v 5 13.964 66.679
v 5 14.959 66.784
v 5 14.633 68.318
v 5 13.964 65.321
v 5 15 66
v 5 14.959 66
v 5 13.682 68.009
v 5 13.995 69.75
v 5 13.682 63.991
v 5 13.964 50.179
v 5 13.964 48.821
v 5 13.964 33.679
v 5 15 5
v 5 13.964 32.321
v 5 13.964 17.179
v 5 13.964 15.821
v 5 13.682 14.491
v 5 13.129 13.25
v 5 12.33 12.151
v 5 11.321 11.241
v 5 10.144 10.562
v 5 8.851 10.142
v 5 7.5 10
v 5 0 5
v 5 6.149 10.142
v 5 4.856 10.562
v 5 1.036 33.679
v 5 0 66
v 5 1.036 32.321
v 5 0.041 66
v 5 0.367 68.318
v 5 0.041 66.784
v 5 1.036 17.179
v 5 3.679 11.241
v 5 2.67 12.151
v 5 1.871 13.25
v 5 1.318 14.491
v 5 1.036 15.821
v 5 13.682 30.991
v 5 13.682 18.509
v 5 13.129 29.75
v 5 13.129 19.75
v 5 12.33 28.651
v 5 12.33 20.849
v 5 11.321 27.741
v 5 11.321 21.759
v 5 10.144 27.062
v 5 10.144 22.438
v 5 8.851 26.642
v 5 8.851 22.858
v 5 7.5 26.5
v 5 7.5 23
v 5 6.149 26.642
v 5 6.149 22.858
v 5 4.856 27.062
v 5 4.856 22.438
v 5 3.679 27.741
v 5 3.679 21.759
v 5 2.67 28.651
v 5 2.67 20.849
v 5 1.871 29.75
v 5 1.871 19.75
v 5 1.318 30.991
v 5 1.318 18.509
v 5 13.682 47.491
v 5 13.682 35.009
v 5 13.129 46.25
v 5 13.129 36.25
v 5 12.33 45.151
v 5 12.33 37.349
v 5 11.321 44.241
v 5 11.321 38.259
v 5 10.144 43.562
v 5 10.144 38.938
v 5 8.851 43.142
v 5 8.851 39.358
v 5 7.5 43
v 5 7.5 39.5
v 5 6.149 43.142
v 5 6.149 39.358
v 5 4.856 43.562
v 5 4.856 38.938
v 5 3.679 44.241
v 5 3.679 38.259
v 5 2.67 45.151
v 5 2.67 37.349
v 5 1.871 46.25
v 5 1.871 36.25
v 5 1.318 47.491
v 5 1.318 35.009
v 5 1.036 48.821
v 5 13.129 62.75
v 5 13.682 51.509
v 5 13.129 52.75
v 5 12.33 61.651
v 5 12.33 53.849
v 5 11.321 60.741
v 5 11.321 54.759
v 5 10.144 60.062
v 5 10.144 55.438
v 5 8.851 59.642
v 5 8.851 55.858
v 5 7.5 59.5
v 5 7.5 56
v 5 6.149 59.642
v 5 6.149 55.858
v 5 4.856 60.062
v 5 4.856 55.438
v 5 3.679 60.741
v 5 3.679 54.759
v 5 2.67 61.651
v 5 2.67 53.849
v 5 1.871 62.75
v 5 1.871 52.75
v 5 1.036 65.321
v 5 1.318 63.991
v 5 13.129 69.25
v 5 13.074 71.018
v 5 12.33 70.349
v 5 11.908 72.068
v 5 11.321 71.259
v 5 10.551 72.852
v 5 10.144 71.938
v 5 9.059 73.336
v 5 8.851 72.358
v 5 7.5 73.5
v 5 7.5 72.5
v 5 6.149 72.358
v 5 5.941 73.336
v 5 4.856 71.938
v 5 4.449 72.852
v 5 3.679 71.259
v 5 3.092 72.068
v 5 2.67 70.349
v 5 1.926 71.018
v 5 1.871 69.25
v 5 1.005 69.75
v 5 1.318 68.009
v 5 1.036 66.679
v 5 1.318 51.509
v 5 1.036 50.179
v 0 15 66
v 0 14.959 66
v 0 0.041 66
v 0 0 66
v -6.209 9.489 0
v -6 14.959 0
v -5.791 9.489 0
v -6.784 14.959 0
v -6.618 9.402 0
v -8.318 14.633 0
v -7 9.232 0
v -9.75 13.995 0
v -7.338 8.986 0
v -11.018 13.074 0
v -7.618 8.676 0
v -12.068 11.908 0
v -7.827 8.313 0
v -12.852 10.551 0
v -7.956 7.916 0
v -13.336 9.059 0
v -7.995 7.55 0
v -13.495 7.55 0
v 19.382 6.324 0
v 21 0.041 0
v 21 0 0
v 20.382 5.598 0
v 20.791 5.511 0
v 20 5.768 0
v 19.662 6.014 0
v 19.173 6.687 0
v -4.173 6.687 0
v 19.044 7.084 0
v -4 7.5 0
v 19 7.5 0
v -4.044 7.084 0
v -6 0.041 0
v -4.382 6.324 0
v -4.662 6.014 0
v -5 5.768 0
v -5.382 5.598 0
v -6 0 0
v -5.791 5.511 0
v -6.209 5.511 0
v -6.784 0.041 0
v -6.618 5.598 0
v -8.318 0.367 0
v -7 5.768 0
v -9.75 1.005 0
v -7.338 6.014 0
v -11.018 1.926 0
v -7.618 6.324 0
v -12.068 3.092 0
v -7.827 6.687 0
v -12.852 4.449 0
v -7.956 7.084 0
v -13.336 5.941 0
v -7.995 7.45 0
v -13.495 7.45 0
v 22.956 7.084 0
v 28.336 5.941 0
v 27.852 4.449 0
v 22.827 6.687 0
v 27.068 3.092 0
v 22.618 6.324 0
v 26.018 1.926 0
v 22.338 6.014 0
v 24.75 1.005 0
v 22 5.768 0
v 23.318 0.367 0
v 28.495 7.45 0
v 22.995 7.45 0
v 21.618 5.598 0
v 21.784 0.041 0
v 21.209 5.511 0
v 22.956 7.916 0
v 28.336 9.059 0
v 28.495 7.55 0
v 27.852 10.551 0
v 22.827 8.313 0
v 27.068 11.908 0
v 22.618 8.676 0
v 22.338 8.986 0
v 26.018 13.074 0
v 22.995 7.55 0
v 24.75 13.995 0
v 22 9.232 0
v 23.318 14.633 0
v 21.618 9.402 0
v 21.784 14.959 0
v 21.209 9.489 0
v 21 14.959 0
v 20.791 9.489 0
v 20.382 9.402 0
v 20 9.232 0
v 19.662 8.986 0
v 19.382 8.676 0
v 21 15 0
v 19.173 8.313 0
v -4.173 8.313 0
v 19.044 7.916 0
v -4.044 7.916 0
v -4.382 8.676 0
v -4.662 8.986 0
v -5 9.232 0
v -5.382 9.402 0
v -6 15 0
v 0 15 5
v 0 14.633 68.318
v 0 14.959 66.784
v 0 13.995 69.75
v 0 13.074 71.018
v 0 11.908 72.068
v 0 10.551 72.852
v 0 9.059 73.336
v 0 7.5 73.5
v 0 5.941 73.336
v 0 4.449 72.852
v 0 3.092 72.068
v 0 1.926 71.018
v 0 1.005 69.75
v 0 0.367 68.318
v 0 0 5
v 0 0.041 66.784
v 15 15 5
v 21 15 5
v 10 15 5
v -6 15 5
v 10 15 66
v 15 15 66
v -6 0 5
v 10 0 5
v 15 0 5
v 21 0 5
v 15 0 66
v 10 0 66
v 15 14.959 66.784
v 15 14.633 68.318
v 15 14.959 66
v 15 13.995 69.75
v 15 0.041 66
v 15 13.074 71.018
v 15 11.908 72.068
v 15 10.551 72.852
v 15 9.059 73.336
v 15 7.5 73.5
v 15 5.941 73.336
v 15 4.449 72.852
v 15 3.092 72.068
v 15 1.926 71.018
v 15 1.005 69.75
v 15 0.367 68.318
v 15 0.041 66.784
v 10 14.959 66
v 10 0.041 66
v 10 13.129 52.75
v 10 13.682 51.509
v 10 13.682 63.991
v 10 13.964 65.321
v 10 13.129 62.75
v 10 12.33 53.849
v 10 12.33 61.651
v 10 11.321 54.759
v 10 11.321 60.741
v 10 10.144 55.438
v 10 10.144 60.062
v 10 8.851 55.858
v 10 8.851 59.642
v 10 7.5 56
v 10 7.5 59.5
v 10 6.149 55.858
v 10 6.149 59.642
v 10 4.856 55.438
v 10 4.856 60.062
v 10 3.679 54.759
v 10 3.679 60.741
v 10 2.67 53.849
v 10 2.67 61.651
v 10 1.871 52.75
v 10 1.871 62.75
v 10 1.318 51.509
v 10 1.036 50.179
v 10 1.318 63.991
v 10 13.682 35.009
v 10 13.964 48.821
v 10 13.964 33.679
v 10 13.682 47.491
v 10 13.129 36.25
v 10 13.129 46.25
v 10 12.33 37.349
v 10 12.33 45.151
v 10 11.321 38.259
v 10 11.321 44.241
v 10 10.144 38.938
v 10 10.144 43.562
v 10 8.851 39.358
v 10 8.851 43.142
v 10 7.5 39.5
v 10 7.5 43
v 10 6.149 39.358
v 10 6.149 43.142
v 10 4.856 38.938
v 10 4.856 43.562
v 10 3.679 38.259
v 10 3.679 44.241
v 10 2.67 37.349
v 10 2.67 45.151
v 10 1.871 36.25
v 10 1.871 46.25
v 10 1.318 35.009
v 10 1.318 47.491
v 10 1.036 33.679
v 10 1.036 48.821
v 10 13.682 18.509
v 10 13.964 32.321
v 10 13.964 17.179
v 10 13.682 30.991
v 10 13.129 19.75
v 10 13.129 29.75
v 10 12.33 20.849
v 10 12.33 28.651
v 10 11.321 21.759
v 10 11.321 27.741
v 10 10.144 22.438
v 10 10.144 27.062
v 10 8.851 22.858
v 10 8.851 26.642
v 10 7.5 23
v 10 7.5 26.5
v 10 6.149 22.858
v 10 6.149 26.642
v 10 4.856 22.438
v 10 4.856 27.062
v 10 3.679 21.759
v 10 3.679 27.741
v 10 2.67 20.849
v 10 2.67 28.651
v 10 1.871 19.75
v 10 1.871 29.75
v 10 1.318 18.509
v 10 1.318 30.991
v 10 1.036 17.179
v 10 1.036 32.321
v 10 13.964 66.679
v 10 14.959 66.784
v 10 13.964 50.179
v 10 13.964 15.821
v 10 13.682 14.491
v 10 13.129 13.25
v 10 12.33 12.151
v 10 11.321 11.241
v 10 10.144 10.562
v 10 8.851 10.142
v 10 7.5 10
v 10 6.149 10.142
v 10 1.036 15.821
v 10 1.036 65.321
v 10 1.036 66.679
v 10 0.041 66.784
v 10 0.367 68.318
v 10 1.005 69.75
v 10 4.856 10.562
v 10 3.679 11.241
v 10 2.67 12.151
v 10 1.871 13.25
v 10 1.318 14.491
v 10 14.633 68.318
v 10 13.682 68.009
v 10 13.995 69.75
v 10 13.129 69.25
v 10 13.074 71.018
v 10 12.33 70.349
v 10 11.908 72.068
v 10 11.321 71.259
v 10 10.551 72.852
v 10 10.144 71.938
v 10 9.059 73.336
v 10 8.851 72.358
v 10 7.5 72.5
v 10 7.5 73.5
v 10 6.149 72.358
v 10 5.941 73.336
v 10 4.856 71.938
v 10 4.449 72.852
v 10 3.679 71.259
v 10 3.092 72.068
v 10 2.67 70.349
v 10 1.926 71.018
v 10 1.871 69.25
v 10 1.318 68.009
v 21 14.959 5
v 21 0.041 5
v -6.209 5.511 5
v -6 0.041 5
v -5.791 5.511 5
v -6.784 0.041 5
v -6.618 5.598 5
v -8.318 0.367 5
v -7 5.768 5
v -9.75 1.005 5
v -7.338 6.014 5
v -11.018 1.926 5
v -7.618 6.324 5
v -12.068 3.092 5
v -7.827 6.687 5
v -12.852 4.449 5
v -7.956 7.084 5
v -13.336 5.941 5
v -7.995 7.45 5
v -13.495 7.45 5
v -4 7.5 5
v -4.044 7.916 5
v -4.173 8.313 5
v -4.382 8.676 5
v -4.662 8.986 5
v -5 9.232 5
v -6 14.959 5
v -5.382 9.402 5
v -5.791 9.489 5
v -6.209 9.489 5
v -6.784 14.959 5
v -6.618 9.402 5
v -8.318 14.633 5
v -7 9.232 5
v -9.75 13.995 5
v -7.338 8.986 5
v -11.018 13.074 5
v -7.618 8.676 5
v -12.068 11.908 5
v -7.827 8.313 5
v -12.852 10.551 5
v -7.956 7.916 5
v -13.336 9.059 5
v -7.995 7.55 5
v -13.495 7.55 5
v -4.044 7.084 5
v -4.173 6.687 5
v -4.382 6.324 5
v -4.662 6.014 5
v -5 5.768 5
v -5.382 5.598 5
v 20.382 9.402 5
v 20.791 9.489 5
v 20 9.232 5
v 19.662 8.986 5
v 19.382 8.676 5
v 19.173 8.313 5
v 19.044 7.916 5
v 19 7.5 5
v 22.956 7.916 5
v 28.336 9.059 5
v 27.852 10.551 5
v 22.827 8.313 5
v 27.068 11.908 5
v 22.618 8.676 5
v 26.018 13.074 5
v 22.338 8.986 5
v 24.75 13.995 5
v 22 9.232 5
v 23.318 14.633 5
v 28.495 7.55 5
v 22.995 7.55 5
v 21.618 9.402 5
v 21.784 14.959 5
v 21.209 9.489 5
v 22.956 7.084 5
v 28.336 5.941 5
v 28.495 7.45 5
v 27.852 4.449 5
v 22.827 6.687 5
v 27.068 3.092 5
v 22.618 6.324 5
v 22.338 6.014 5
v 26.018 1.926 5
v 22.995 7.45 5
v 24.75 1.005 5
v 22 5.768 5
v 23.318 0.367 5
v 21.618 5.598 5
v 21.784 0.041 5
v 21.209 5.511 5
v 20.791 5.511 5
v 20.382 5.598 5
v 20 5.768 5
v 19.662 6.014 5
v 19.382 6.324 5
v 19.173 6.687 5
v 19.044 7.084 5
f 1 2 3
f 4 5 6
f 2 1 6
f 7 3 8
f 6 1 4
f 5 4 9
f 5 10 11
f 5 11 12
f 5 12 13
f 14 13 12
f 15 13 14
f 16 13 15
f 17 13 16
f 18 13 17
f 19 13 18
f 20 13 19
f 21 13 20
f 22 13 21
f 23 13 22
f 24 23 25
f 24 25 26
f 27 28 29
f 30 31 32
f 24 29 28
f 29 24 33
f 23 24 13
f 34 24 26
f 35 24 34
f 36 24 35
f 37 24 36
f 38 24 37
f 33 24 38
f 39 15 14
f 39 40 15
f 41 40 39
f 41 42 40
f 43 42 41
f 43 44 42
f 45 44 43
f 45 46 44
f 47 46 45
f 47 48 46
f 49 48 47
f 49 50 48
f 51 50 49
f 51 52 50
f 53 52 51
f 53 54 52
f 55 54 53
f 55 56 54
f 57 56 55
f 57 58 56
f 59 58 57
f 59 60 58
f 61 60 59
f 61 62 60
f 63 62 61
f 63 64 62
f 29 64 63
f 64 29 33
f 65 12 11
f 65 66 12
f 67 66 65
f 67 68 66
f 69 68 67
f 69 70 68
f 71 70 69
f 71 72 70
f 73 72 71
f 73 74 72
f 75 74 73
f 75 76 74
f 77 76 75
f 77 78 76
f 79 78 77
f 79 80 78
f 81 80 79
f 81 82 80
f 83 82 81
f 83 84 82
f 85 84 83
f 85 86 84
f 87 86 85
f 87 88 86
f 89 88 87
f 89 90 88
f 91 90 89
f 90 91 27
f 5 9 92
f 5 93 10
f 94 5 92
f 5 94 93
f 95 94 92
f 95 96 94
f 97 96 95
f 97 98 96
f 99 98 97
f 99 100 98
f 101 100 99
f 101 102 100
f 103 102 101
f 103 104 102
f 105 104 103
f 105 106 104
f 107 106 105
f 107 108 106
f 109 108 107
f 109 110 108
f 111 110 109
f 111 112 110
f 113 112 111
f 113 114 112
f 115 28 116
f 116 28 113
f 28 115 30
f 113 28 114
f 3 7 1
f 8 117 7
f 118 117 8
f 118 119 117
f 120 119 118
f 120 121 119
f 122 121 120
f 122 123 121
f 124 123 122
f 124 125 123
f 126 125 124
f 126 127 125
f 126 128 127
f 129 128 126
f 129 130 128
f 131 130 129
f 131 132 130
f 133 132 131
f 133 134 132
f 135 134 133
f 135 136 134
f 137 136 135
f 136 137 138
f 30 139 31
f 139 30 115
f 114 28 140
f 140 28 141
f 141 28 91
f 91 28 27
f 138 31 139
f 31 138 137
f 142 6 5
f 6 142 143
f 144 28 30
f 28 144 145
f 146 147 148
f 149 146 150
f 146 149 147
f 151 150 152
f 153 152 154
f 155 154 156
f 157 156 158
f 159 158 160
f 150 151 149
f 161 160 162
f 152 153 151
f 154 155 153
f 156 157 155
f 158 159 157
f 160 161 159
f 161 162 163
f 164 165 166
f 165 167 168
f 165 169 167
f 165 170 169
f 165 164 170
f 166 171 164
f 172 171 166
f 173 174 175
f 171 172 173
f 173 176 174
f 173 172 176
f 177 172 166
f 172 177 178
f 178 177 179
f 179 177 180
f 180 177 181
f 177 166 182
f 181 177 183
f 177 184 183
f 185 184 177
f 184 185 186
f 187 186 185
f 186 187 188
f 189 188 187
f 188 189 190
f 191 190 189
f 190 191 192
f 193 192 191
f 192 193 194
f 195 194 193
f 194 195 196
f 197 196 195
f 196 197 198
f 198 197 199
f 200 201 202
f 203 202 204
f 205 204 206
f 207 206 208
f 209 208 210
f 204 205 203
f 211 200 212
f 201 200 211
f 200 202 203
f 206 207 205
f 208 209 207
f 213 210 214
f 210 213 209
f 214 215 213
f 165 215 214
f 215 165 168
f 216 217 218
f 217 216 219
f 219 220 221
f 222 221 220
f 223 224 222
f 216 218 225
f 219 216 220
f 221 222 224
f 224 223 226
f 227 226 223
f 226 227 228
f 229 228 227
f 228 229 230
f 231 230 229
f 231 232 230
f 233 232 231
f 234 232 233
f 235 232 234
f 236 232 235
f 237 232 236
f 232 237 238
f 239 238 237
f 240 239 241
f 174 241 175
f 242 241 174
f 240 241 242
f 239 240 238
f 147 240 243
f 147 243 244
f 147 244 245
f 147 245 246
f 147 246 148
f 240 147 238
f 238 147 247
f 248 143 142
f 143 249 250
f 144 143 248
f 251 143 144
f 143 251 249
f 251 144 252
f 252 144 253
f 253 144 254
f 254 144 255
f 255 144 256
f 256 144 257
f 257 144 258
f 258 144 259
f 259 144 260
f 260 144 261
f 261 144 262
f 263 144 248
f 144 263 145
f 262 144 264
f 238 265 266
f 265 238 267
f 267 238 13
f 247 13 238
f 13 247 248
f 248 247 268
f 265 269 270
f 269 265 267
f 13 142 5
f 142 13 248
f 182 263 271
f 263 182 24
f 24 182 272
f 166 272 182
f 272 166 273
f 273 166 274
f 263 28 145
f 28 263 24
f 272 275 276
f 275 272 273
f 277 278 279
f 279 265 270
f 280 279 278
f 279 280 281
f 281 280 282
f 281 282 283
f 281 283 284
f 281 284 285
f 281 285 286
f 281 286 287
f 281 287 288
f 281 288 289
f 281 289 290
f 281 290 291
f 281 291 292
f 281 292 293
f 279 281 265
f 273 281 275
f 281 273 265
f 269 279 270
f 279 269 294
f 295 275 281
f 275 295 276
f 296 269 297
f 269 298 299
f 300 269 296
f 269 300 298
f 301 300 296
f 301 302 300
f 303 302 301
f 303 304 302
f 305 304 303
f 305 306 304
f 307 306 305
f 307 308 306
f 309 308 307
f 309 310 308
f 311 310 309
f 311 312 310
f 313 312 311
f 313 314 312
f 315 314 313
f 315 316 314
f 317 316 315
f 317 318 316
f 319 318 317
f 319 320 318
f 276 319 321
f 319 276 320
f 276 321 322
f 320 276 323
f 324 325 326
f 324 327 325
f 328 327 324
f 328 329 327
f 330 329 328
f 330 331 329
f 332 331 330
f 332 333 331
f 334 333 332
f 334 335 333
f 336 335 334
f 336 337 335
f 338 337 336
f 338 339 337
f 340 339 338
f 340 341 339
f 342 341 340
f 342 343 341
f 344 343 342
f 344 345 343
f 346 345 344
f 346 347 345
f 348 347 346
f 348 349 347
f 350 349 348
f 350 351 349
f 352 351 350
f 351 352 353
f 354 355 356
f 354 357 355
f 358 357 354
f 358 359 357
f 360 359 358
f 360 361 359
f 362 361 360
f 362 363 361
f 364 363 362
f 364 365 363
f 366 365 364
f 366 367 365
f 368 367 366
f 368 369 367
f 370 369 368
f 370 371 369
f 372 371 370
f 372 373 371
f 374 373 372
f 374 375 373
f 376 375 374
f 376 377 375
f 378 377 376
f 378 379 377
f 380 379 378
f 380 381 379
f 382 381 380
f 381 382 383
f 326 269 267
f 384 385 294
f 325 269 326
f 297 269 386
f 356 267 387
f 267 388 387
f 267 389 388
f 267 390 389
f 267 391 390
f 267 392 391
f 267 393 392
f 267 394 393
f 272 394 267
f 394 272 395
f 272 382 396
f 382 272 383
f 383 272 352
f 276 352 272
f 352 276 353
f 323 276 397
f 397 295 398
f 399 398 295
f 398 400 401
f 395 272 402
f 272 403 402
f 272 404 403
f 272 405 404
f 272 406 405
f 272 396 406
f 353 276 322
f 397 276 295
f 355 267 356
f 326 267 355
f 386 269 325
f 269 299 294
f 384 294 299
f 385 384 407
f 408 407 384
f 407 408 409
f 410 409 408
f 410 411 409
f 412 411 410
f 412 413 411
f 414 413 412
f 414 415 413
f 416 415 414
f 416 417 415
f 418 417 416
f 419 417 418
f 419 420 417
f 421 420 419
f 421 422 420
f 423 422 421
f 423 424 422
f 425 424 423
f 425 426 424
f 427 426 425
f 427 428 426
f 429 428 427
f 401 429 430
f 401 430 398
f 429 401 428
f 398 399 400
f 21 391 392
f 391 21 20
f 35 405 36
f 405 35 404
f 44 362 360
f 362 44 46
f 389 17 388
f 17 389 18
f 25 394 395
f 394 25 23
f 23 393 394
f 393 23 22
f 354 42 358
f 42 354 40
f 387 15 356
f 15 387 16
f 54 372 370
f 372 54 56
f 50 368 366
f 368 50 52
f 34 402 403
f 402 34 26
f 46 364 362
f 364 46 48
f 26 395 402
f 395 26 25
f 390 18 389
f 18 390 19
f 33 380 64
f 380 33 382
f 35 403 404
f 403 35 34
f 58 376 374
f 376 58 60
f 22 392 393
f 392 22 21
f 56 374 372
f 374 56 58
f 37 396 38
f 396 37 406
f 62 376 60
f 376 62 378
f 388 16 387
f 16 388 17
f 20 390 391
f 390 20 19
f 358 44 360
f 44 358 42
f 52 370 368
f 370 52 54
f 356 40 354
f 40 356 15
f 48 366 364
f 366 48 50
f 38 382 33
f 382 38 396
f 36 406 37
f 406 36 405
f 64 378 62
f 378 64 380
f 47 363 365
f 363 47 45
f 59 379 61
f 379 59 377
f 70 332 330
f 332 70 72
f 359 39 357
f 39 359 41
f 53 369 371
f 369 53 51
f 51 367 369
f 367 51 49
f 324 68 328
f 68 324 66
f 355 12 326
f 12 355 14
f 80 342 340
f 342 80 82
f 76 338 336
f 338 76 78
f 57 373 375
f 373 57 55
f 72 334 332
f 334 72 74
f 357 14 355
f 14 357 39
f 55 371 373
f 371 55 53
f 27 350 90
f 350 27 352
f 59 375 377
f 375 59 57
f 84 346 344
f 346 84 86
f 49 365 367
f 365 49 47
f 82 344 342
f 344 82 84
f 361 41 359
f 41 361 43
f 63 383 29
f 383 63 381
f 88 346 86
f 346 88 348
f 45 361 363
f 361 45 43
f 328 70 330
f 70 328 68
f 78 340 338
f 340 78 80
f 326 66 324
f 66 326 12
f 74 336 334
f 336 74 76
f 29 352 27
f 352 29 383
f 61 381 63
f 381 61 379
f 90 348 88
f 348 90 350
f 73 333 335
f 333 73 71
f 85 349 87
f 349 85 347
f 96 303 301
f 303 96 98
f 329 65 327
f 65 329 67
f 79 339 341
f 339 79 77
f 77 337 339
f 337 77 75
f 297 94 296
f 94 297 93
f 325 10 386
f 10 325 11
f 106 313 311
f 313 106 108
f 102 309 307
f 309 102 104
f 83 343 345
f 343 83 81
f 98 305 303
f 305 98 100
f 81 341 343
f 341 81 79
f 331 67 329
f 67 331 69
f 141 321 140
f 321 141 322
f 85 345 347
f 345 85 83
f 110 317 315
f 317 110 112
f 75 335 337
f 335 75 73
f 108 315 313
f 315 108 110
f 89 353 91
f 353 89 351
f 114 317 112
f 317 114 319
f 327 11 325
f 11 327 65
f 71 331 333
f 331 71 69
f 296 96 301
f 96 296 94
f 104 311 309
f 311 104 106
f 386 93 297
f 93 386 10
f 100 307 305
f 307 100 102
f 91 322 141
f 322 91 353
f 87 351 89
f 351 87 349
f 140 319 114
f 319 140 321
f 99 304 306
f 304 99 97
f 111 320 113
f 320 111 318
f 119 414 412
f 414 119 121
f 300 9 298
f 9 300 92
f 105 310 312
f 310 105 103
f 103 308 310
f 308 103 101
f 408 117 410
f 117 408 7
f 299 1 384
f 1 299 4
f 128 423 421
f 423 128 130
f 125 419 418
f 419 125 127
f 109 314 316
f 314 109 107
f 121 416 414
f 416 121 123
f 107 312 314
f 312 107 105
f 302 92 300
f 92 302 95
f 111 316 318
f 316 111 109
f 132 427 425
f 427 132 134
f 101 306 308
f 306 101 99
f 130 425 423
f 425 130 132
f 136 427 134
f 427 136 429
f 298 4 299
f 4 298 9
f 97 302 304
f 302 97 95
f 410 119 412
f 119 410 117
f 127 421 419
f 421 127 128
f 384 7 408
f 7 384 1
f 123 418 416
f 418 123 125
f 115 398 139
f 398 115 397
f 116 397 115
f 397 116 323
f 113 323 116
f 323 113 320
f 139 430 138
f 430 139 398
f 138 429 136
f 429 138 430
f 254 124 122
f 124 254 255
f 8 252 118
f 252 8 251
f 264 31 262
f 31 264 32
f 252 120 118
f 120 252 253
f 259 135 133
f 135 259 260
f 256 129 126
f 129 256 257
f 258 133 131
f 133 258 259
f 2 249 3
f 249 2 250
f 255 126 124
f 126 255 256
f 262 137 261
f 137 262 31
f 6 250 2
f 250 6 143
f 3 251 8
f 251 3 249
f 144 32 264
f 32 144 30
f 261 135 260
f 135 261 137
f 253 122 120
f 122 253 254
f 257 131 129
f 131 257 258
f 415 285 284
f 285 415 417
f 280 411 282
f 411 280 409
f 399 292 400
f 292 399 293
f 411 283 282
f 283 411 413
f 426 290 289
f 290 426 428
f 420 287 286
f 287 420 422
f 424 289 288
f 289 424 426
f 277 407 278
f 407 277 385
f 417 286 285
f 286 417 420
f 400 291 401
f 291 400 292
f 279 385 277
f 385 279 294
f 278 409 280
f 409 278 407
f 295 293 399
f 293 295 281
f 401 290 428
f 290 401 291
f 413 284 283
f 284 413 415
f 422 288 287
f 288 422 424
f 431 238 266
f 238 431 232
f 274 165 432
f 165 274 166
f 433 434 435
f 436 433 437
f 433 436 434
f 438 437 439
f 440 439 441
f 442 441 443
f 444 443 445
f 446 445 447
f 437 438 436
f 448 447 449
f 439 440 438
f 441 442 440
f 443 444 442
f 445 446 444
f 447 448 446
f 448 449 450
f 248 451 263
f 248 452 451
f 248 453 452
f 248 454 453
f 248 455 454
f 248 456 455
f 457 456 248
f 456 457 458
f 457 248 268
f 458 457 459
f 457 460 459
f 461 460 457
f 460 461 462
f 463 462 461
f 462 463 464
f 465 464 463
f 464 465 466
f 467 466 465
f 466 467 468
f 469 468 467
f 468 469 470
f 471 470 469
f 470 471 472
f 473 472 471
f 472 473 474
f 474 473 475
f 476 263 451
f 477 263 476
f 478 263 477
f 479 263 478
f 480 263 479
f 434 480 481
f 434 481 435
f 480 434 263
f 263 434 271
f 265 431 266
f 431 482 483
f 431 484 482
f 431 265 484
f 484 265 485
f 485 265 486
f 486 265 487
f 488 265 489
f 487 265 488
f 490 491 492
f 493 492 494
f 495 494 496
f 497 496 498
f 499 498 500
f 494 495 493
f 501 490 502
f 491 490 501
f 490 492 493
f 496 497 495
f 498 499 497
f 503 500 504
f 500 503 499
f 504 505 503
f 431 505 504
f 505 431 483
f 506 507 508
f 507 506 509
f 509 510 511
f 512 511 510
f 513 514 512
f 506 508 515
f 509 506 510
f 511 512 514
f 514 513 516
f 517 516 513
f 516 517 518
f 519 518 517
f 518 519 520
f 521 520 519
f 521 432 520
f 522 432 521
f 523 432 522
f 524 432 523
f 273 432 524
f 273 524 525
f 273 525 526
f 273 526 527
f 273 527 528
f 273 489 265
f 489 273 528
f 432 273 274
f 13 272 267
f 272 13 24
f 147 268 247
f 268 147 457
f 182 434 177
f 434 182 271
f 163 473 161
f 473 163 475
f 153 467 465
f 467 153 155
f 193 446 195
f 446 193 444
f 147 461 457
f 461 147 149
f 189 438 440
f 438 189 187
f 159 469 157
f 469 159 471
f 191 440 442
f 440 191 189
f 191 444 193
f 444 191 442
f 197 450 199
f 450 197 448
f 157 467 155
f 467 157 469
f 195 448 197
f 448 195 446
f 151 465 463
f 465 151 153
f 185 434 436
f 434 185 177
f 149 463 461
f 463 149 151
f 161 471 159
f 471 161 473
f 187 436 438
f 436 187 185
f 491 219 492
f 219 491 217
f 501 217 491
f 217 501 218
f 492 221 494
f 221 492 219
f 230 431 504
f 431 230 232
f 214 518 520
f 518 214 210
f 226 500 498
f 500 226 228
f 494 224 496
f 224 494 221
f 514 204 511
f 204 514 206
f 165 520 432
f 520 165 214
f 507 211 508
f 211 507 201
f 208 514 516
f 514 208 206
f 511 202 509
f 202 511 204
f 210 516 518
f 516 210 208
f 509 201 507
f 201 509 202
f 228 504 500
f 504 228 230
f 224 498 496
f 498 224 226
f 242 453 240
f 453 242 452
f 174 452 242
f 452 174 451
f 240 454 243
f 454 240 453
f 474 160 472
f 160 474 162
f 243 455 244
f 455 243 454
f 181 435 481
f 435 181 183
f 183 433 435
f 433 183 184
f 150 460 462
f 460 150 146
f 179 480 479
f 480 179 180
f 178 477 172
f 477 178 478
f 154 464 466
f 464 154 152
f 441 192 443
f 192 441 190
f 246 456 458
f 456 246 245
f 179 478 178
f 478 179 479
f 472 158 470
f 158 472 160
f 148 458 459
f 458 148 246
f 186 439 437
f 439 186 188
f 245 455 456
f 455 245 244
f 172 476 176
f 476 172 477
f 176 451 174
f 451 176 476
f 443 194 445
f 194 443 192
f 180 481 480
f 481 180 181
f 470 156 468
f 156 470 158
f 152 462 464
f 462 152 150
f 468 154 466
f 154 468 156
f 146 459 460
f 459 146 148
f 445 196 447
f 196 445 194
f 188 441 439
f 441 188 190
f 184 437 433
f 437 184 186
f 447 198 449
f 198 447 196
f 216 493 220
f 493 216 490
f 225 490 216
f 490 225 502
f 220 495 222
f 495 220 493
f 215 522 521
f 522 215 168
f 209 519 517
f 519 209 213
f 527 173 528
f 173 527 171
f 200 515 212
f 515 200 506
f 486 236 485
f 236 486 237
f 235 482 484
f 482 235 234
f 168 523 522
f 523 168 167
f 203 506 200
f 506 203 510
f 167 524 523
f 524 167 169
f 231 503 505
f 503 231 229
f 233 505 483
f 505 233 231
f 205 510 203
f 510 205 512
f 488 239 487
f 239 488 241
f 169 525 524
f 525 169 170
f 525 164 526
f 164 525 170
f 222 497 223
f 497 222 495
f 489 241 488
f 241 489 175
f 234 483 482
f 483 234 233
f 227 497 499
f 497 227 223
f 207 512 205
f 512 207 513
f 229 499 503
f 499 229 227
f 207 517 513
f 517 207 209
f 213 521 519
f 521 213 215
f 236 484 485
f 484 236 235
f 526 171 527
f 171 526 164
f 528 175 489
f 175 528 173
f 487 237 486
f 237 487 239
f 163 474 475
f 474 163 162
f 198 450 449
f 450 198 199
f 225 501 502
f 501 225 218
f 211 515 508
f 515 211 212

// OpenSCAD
module tensioner()
{
	$fs = 0.1;
	
	wall = 5;
	thick = wall*3;
	width = wall*3;
	crossBarDia = thick-2;
	height = wall*4 + (wall+crossBarDia/2) * 4;

	bolt = 4;
	fudge = 0.25;

	//center it.
//	translate([-width/2, 0, 0])
	
	{
		difference()
		{
			union()
			{
				//the main vertical housing
				cube([wall, thick, height]);
				translate([wall*2, 0, 0])
					cube([wall, thick, height]);
					
				//the lower cylinder
				translate([0,thick/2, wall+ (wall+crossBarDia/2)])
					rotate([0,90,0])
						cylinder(r=crossBarDia/2, h=width);
						
				//the middle cylinder
				translate([0,thick/2, wall*2 + (wall+crossBarDia/2) * 2])
					rotate([0,90,0])
						cylinder(r=crossBarDia/2, h=width);
						
				//the middle cylinder
				translate([0,thick/2, wall*3 + (wall+crossBarDia/2) * 3])
					rotate([0,90,0])
						cylinder(r=crossBarDia/2, h=width);
						
				//the upper, smaller cylinder
				translate([0,thick/2, wall*4 + (wall+crossBarDia/2) * 4])						
					rotate([0,90,0])
						cylinder(r=crossBarDia/2, h=width);
						
				//the upper left flange
				translate([0,thick/2, height])						
					rotate([0,90,0])
						cylinder(r=thick/2, h=wall);
						
				//the upper right flange
				translate([wall*2,thick/2, height])						
					rotate([0,90,0])
						cylinder(r=thick/2, h=wall);
				
				//flanges for mounting.
				translate([-bolt*1.5, 0, 0])
					cube([width+bolt*3, thick, wall]);
				translate([-bolt*1.5, thick/2, 0])
					cylinder(r=thick/2, h=wall);
				translate([width+bolt*1.5, thick/2, 0])
					cylinder(r=thick/2, h=wall);
			}

			//bolt heads for flange
			translate([-bolt*1.5, thick/2, -1])
				#cylinder(r=bolt/2, h=wall+2);
			translate([width+bolt*1.5, thick/2, -1])
				#cylinder(r=bolt/2, h=wall+2);
			
			//tiny slices for path simplification.
			translate([-bolt*3, thick/2, wall/2])
				cube(size=[wall*2, 0.1, wall], center=true);
			translate([width+bolt*3, thick/2, wall/2])
				cube(size=[wall*2, 0.1, wall], center=true);
		}
	}
}

tensioner();
